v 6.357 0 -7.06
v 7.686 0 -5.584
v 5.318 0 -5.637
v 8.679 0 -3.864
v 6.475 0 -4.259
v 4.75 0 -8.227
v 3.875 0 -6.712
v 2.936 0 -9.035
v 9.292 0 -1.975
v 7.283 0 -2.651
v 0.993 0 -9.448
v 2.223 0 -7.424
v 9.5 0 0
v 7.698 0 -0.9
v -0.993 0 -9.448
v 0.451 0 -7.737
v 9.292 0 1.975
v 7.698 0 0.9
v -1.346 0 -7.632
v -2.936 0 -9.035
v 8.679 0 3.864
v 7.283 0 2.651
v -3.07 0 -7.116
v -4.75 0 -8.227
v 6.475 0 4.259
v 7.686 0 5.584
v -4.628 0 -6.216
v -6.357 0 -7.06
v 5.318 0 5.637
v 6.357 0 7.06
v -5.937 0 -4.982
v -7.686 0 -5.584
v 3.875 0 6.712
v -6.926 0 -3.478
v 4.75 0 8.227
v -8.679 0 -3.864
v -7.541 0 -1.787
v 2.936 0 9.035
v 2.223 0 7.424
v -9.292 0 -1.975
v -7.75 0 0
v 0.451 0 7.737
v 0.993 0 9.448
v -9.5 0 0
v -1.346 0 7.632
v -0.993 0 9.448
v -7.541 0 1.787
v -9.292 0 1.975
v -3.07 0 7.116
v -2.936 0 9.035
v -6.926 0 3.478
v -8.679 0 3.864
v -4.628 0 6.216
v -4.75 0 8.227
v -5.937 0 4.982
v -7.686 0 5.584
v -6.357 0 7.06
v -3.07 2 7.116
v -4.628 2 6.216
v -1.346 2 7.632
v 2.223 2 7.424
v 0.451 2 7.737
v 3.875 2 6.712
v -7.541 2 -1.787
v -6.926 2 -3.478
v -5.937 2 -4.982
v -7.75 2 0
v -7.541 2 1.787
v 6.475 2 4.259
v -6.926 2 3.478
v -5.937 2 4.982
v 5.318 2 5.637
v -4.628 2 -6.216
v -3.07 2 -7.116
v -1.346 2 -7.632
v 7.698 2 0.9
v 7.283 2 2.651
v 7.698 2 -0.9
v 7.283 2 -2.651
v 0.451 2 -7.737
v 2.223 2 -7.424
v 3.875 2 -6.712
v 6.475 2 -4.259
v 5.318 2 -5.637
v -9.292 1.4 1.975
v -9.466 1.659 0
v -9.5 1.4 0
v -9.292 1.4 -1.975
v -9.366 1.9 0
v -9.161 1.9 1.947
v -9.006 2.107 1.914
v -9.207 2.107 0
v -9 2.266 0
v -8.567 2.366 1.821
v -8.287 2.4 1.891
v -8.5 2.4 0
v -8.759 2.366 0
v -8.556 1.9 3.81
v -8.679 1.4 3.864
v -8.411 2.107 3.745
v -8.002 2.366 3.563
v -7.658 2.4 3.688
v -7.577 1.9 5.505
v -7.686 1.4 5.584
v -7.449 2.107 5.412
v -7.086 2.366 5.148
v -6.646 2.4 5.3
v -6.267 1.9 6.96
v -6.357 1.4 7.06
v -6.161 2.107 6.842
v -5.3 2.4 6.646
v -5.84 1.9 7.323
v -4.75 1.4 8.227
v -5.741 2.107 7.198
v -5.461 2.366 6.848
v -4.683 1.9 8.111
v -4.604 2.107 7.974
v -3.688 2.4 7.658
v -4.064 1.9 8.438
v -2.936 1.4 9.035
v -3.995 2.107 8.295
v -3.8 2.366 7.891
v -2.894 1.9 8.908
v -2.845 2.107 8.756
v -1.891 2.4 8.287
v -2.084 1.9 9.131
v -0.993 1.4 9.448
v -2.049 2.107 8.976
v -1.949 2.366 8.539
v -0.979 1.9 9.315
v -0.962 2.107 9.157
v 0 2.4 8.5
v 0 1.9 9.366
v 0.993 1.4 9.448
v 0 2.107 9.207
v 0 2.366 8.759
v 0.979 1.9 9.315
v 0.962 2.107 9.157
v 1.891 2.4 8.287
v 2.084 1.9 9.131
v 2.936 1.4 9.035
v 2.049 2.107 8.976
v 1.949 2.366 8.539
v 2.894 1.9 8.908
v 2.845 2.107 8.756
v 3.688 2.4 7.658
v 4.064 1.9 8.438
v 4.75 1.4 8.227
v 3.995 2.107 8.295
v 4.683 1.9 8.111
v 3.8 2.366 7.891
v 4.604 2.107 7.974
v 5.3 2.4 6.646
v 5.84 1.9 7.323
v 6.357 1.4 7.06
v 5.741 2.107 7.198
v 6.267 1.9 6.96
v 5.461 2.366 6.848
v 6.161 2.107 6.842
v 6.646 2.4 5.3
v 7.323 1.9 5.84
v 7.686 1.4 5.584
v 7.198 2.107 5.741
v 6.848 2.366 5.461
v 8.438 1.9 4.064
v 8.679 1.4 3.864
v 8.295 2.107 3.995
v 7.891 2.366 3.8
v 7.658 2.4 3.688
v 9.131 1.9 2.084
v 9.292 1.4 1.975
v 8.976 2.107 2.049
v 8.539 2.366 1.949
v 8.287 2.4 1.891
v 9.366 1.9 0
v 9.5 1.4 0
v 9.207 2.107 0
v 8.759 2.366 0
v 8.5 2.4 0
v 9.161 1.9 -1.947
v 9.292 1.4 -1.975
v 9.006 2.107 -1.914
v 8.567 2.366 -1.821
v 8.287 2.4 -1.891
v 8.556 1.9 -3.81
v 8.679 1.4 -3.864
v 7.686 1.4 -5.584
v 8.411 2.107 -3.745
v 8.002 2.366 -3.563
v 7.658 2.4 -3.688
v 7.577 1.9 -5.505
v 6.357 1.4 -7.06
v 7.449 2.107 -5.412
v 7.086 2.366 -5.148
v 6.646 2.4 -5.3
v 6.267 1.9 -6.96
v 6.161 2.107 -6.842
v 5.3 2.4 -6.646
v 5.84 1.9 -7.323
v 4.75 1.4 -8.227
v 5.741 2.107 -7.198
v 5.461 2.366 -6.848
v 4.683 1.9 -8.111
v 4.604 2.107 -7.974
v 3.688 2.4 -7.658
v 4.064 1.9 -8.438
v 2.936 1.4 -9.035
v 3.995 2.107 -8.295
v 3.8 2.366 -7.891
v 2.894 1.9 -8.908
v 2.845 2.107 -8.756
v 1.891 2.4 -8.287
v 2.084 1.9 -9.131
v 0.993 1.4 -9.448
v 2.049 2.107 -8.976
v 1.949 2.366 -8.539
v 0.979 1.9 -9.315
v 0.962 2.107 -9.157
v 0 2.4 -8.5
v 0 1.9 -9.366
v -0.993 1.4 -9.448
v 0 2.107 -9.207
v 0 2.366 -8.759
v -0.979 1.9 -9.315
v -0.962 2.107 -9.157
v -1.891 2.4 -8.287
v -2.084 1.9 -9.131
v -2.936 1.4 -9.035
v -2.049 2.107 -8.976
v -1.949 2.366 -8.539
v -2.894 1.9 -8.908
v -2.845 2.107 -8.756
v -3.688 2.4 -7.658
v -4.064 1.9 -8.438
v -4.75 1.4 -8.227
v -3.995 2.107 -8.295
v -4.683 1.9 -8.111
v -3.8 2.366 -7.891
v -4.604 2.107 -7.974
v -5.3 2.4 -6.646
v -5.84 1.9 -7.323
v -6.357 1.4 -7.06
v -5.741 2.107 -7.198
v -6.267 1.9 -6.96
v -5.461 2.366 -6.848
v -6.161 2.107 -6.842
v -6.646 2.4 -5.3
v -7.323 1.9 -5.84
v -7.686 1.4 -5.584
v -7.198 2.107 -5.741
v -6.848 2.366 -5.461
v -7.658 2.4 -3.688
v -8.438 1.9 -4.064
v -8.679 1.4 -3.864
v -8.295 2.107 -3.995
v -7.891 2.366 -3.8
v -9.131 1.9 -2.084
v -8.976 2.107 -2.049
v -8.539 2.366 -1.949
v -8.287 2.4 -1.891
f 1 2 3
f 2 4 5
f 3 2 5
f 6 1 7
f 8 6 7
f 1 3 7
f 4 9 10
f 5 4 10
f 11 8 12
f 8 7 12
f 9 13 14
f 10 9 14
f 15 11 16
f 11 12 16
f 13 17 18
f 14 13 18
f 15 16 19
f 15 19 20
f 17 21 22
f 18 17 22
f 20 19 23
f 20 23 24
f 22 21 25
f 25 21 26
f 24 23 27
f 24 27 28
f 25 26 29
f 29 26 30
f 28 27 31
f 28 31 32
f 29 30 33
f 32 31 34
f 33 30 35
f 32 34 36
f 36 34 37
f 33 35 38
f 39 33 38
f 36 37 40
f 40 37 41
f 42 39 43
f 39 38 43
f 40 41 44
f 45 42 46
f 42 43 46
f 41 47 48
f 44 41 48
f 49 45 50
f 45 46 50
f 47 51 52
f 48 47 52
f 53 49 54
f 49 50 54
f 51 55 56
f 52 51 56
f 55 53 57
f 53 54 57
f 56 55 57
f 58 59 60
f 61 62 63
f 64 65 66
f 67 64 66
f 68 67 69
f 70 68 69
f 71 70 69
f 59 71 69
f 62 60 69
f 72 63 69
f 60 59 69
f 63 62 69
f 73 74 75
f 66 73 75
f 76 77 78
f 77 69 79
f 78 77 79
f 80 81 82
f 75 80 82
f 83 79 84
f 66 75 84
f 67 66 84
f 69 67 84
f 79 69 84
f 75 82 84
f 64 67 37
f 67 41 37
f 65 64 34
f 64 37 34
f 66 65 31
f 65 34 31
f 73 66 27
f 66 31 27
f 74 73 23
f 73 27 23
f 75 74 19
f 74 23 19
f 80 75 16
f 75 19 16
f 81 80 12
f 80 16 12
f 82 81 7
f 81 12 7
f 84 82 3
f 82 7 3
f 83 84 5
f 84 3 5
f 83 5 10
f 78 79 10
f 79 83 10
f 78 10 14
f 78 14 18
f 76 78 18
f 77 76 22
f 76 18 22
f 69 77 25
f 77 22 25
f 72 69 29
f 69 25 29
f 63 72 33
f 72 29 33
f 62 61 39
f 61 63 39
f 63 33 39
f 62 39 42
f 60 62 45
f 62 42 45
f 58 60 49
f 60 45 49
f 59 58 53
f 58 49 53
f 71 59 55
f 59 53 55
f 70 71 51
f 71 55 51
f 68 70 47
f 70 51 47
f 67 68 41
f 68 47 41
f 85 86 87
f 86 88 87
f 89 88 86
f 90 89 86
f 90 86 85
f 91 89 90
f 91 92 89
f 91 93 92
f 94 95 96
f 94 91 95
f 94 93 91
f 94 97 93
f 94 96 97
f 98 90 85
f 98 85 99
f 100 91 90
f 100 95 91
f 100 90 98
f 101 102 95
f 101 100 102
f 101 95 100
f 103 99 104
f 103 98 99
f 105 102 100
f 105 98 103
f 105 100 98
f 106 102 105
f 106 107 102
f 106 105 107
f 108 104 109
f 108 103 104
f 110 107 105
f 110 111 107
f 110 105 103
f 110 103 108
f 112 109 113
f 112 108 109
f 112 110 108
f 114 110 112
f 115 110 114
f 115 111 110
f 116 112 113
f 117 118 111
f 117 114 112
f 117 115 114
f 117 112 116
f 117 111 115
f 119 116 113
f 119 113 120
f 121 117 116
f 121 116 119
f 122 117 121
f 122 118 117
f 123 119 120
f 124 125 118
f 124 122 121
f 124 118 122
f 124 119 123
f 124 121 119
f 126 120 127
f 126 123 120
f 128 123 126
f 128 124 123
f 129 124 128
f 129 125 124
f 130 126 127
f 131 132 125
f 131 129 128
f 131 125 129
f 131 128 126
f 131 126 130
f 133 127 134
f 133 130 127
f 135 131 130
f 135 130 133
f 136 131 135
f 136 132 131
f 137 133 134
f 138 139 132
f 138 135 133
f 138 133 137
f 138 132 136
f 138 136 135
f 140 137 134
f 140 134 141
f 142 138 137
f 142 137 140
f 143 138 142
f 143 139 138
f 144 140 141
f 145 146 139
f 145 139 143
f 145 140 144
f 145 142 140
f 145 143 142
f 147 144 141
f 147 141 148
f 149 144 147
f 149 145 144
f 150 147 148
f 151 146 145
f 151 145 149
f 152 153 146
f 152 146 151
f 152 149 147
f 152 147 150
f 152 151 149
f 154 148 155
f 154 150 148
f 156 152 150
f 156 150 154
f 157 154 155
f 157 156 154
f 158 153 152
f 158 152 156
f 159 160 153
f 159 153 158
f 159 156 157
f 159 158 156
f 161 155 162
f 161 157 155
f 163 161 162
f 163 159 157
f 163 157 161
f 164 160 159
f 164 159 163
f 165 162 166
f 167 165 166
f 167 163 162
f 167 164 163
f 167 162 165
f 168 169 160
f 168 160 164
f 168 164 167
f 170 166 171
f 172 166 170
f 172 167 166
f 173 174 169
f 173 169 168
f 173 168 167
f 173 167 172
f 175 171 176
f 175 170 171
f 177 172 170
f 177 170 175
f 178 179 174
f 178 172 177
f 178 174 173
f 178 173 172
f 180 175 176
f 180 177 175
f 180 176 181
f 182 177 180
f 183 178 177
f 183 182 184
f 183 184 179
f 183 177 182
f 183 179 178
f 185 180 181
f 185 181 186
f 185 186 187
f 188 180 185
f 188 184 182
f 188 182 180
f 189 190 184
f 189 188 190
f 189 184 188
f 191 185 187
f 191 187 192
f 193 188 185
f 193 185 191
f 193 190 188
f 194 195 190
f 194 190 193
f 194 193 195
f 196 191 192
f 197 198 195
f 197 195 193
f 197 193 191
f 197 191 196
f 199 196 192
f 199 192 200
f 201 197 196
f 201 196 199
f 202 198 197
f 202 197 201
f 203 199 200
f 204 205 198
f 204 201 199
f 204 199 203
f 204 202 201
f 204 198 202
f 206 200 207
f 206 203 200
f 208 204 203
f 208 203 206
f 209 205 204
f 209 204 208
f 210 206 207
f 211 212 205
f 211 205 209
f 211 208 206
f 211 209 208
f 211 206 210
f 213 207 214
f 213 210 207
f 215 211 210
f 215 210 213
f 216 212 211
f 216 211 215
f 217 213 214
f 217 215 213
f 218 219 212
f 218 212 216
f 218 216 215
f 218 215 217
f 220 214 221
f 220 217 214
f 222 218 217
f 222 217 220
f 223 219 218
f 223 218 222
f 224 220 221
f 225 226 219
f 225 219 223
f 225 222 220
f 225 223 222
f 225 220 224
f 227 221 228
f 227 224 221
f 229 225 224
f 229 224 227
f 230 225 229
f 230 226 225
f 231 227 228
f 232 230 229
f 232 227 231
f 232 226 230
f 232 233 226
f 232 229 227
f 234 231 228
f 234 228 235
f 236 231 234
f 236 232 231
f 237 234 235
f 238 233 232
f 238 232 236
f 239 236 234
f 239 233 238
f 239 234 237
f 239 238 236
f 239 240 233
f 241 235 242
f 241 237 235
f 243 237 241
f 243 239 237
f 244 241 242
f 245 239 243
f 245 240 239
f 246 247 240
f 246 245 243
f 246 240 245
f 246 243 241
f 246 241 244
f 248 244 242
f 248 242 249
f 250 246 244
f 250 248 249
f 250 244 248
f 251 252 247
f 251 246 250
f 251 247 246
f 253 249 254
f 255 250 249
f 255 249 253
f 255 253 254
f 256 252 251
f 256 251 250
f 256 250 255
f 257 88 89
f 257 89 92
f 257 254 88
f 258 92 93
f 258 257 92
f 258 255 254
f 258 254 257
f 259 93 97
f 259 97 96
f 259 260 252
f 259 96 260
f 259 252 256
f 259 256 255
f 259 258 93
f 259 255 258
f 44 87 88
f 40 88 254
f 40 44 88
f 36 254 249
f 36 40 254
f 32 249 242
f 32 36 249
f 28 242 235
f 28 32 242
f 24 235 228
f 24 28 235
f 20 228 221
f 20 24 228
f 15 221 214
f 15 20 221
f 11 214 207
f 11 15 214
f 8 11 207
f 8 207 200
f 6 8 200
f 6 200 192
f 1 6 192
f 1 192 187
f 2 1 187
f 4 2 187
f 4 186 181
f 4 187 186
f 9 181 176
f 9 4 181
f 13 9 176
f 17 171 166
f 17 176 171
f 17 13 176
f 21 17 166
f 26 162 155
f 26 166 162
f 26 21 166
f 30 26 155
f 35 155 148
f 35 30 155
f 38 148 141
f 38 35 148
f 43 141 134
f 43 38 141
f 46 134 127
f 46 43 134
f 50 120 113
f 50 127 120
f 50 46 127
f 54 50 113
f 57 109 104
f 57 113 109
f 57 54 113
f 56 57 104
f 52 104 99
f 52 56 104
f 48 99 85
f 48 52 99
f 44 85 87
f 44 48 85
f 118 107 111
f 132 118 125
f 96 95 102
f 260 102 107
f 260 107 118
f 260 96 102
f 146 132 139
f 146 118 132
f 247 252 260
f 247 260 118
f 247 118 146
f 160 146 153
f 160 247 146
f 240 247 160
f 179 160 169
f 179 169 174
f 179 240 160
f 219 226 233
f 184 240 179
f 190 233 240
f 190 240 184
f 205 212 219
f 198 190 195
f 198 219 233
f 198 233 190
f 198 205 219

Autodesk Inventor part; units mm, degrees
ref_plane "YZ Plane" through (0, 0, 0) normal (1, 0, 0) x (0, 1, 0)
ref_plane "XZ Plane" through (0, 0, 0) normal (0, 1, 0) x (-1, 0, 0)
ref_plane "XY Plane" through (0, 0, 0) normal (0, 0, 1) x (1, 0, 0)
sketch "Эскиз1" plane through (0, 0, 0) normal (0, 1, 0) x (-1, 0, 0)
  circle A0 centre (0, 0) radius 9.5
  circle A1 centre (0, 0) radius 7.75
  dimension "d0" = 19
  dimension "d1" = 15.5
extrude "Выдавливание1" add sketch "Эскиз1" along normal blind 2
sketch "Эскиз2" plane through (0, 2, 0) normal (0, 1, 0) x (1, 0, 0)
  circle A0 centre (0, 0) radius 9.5 projected
extrude "Выдавливание2" add sketch "Эскиз2" along normal blind 0.4
fillet "Сопряжение1" radius 1 1 edges at (-9.5, 2.4, 0)
properties part number "derz magnit"
